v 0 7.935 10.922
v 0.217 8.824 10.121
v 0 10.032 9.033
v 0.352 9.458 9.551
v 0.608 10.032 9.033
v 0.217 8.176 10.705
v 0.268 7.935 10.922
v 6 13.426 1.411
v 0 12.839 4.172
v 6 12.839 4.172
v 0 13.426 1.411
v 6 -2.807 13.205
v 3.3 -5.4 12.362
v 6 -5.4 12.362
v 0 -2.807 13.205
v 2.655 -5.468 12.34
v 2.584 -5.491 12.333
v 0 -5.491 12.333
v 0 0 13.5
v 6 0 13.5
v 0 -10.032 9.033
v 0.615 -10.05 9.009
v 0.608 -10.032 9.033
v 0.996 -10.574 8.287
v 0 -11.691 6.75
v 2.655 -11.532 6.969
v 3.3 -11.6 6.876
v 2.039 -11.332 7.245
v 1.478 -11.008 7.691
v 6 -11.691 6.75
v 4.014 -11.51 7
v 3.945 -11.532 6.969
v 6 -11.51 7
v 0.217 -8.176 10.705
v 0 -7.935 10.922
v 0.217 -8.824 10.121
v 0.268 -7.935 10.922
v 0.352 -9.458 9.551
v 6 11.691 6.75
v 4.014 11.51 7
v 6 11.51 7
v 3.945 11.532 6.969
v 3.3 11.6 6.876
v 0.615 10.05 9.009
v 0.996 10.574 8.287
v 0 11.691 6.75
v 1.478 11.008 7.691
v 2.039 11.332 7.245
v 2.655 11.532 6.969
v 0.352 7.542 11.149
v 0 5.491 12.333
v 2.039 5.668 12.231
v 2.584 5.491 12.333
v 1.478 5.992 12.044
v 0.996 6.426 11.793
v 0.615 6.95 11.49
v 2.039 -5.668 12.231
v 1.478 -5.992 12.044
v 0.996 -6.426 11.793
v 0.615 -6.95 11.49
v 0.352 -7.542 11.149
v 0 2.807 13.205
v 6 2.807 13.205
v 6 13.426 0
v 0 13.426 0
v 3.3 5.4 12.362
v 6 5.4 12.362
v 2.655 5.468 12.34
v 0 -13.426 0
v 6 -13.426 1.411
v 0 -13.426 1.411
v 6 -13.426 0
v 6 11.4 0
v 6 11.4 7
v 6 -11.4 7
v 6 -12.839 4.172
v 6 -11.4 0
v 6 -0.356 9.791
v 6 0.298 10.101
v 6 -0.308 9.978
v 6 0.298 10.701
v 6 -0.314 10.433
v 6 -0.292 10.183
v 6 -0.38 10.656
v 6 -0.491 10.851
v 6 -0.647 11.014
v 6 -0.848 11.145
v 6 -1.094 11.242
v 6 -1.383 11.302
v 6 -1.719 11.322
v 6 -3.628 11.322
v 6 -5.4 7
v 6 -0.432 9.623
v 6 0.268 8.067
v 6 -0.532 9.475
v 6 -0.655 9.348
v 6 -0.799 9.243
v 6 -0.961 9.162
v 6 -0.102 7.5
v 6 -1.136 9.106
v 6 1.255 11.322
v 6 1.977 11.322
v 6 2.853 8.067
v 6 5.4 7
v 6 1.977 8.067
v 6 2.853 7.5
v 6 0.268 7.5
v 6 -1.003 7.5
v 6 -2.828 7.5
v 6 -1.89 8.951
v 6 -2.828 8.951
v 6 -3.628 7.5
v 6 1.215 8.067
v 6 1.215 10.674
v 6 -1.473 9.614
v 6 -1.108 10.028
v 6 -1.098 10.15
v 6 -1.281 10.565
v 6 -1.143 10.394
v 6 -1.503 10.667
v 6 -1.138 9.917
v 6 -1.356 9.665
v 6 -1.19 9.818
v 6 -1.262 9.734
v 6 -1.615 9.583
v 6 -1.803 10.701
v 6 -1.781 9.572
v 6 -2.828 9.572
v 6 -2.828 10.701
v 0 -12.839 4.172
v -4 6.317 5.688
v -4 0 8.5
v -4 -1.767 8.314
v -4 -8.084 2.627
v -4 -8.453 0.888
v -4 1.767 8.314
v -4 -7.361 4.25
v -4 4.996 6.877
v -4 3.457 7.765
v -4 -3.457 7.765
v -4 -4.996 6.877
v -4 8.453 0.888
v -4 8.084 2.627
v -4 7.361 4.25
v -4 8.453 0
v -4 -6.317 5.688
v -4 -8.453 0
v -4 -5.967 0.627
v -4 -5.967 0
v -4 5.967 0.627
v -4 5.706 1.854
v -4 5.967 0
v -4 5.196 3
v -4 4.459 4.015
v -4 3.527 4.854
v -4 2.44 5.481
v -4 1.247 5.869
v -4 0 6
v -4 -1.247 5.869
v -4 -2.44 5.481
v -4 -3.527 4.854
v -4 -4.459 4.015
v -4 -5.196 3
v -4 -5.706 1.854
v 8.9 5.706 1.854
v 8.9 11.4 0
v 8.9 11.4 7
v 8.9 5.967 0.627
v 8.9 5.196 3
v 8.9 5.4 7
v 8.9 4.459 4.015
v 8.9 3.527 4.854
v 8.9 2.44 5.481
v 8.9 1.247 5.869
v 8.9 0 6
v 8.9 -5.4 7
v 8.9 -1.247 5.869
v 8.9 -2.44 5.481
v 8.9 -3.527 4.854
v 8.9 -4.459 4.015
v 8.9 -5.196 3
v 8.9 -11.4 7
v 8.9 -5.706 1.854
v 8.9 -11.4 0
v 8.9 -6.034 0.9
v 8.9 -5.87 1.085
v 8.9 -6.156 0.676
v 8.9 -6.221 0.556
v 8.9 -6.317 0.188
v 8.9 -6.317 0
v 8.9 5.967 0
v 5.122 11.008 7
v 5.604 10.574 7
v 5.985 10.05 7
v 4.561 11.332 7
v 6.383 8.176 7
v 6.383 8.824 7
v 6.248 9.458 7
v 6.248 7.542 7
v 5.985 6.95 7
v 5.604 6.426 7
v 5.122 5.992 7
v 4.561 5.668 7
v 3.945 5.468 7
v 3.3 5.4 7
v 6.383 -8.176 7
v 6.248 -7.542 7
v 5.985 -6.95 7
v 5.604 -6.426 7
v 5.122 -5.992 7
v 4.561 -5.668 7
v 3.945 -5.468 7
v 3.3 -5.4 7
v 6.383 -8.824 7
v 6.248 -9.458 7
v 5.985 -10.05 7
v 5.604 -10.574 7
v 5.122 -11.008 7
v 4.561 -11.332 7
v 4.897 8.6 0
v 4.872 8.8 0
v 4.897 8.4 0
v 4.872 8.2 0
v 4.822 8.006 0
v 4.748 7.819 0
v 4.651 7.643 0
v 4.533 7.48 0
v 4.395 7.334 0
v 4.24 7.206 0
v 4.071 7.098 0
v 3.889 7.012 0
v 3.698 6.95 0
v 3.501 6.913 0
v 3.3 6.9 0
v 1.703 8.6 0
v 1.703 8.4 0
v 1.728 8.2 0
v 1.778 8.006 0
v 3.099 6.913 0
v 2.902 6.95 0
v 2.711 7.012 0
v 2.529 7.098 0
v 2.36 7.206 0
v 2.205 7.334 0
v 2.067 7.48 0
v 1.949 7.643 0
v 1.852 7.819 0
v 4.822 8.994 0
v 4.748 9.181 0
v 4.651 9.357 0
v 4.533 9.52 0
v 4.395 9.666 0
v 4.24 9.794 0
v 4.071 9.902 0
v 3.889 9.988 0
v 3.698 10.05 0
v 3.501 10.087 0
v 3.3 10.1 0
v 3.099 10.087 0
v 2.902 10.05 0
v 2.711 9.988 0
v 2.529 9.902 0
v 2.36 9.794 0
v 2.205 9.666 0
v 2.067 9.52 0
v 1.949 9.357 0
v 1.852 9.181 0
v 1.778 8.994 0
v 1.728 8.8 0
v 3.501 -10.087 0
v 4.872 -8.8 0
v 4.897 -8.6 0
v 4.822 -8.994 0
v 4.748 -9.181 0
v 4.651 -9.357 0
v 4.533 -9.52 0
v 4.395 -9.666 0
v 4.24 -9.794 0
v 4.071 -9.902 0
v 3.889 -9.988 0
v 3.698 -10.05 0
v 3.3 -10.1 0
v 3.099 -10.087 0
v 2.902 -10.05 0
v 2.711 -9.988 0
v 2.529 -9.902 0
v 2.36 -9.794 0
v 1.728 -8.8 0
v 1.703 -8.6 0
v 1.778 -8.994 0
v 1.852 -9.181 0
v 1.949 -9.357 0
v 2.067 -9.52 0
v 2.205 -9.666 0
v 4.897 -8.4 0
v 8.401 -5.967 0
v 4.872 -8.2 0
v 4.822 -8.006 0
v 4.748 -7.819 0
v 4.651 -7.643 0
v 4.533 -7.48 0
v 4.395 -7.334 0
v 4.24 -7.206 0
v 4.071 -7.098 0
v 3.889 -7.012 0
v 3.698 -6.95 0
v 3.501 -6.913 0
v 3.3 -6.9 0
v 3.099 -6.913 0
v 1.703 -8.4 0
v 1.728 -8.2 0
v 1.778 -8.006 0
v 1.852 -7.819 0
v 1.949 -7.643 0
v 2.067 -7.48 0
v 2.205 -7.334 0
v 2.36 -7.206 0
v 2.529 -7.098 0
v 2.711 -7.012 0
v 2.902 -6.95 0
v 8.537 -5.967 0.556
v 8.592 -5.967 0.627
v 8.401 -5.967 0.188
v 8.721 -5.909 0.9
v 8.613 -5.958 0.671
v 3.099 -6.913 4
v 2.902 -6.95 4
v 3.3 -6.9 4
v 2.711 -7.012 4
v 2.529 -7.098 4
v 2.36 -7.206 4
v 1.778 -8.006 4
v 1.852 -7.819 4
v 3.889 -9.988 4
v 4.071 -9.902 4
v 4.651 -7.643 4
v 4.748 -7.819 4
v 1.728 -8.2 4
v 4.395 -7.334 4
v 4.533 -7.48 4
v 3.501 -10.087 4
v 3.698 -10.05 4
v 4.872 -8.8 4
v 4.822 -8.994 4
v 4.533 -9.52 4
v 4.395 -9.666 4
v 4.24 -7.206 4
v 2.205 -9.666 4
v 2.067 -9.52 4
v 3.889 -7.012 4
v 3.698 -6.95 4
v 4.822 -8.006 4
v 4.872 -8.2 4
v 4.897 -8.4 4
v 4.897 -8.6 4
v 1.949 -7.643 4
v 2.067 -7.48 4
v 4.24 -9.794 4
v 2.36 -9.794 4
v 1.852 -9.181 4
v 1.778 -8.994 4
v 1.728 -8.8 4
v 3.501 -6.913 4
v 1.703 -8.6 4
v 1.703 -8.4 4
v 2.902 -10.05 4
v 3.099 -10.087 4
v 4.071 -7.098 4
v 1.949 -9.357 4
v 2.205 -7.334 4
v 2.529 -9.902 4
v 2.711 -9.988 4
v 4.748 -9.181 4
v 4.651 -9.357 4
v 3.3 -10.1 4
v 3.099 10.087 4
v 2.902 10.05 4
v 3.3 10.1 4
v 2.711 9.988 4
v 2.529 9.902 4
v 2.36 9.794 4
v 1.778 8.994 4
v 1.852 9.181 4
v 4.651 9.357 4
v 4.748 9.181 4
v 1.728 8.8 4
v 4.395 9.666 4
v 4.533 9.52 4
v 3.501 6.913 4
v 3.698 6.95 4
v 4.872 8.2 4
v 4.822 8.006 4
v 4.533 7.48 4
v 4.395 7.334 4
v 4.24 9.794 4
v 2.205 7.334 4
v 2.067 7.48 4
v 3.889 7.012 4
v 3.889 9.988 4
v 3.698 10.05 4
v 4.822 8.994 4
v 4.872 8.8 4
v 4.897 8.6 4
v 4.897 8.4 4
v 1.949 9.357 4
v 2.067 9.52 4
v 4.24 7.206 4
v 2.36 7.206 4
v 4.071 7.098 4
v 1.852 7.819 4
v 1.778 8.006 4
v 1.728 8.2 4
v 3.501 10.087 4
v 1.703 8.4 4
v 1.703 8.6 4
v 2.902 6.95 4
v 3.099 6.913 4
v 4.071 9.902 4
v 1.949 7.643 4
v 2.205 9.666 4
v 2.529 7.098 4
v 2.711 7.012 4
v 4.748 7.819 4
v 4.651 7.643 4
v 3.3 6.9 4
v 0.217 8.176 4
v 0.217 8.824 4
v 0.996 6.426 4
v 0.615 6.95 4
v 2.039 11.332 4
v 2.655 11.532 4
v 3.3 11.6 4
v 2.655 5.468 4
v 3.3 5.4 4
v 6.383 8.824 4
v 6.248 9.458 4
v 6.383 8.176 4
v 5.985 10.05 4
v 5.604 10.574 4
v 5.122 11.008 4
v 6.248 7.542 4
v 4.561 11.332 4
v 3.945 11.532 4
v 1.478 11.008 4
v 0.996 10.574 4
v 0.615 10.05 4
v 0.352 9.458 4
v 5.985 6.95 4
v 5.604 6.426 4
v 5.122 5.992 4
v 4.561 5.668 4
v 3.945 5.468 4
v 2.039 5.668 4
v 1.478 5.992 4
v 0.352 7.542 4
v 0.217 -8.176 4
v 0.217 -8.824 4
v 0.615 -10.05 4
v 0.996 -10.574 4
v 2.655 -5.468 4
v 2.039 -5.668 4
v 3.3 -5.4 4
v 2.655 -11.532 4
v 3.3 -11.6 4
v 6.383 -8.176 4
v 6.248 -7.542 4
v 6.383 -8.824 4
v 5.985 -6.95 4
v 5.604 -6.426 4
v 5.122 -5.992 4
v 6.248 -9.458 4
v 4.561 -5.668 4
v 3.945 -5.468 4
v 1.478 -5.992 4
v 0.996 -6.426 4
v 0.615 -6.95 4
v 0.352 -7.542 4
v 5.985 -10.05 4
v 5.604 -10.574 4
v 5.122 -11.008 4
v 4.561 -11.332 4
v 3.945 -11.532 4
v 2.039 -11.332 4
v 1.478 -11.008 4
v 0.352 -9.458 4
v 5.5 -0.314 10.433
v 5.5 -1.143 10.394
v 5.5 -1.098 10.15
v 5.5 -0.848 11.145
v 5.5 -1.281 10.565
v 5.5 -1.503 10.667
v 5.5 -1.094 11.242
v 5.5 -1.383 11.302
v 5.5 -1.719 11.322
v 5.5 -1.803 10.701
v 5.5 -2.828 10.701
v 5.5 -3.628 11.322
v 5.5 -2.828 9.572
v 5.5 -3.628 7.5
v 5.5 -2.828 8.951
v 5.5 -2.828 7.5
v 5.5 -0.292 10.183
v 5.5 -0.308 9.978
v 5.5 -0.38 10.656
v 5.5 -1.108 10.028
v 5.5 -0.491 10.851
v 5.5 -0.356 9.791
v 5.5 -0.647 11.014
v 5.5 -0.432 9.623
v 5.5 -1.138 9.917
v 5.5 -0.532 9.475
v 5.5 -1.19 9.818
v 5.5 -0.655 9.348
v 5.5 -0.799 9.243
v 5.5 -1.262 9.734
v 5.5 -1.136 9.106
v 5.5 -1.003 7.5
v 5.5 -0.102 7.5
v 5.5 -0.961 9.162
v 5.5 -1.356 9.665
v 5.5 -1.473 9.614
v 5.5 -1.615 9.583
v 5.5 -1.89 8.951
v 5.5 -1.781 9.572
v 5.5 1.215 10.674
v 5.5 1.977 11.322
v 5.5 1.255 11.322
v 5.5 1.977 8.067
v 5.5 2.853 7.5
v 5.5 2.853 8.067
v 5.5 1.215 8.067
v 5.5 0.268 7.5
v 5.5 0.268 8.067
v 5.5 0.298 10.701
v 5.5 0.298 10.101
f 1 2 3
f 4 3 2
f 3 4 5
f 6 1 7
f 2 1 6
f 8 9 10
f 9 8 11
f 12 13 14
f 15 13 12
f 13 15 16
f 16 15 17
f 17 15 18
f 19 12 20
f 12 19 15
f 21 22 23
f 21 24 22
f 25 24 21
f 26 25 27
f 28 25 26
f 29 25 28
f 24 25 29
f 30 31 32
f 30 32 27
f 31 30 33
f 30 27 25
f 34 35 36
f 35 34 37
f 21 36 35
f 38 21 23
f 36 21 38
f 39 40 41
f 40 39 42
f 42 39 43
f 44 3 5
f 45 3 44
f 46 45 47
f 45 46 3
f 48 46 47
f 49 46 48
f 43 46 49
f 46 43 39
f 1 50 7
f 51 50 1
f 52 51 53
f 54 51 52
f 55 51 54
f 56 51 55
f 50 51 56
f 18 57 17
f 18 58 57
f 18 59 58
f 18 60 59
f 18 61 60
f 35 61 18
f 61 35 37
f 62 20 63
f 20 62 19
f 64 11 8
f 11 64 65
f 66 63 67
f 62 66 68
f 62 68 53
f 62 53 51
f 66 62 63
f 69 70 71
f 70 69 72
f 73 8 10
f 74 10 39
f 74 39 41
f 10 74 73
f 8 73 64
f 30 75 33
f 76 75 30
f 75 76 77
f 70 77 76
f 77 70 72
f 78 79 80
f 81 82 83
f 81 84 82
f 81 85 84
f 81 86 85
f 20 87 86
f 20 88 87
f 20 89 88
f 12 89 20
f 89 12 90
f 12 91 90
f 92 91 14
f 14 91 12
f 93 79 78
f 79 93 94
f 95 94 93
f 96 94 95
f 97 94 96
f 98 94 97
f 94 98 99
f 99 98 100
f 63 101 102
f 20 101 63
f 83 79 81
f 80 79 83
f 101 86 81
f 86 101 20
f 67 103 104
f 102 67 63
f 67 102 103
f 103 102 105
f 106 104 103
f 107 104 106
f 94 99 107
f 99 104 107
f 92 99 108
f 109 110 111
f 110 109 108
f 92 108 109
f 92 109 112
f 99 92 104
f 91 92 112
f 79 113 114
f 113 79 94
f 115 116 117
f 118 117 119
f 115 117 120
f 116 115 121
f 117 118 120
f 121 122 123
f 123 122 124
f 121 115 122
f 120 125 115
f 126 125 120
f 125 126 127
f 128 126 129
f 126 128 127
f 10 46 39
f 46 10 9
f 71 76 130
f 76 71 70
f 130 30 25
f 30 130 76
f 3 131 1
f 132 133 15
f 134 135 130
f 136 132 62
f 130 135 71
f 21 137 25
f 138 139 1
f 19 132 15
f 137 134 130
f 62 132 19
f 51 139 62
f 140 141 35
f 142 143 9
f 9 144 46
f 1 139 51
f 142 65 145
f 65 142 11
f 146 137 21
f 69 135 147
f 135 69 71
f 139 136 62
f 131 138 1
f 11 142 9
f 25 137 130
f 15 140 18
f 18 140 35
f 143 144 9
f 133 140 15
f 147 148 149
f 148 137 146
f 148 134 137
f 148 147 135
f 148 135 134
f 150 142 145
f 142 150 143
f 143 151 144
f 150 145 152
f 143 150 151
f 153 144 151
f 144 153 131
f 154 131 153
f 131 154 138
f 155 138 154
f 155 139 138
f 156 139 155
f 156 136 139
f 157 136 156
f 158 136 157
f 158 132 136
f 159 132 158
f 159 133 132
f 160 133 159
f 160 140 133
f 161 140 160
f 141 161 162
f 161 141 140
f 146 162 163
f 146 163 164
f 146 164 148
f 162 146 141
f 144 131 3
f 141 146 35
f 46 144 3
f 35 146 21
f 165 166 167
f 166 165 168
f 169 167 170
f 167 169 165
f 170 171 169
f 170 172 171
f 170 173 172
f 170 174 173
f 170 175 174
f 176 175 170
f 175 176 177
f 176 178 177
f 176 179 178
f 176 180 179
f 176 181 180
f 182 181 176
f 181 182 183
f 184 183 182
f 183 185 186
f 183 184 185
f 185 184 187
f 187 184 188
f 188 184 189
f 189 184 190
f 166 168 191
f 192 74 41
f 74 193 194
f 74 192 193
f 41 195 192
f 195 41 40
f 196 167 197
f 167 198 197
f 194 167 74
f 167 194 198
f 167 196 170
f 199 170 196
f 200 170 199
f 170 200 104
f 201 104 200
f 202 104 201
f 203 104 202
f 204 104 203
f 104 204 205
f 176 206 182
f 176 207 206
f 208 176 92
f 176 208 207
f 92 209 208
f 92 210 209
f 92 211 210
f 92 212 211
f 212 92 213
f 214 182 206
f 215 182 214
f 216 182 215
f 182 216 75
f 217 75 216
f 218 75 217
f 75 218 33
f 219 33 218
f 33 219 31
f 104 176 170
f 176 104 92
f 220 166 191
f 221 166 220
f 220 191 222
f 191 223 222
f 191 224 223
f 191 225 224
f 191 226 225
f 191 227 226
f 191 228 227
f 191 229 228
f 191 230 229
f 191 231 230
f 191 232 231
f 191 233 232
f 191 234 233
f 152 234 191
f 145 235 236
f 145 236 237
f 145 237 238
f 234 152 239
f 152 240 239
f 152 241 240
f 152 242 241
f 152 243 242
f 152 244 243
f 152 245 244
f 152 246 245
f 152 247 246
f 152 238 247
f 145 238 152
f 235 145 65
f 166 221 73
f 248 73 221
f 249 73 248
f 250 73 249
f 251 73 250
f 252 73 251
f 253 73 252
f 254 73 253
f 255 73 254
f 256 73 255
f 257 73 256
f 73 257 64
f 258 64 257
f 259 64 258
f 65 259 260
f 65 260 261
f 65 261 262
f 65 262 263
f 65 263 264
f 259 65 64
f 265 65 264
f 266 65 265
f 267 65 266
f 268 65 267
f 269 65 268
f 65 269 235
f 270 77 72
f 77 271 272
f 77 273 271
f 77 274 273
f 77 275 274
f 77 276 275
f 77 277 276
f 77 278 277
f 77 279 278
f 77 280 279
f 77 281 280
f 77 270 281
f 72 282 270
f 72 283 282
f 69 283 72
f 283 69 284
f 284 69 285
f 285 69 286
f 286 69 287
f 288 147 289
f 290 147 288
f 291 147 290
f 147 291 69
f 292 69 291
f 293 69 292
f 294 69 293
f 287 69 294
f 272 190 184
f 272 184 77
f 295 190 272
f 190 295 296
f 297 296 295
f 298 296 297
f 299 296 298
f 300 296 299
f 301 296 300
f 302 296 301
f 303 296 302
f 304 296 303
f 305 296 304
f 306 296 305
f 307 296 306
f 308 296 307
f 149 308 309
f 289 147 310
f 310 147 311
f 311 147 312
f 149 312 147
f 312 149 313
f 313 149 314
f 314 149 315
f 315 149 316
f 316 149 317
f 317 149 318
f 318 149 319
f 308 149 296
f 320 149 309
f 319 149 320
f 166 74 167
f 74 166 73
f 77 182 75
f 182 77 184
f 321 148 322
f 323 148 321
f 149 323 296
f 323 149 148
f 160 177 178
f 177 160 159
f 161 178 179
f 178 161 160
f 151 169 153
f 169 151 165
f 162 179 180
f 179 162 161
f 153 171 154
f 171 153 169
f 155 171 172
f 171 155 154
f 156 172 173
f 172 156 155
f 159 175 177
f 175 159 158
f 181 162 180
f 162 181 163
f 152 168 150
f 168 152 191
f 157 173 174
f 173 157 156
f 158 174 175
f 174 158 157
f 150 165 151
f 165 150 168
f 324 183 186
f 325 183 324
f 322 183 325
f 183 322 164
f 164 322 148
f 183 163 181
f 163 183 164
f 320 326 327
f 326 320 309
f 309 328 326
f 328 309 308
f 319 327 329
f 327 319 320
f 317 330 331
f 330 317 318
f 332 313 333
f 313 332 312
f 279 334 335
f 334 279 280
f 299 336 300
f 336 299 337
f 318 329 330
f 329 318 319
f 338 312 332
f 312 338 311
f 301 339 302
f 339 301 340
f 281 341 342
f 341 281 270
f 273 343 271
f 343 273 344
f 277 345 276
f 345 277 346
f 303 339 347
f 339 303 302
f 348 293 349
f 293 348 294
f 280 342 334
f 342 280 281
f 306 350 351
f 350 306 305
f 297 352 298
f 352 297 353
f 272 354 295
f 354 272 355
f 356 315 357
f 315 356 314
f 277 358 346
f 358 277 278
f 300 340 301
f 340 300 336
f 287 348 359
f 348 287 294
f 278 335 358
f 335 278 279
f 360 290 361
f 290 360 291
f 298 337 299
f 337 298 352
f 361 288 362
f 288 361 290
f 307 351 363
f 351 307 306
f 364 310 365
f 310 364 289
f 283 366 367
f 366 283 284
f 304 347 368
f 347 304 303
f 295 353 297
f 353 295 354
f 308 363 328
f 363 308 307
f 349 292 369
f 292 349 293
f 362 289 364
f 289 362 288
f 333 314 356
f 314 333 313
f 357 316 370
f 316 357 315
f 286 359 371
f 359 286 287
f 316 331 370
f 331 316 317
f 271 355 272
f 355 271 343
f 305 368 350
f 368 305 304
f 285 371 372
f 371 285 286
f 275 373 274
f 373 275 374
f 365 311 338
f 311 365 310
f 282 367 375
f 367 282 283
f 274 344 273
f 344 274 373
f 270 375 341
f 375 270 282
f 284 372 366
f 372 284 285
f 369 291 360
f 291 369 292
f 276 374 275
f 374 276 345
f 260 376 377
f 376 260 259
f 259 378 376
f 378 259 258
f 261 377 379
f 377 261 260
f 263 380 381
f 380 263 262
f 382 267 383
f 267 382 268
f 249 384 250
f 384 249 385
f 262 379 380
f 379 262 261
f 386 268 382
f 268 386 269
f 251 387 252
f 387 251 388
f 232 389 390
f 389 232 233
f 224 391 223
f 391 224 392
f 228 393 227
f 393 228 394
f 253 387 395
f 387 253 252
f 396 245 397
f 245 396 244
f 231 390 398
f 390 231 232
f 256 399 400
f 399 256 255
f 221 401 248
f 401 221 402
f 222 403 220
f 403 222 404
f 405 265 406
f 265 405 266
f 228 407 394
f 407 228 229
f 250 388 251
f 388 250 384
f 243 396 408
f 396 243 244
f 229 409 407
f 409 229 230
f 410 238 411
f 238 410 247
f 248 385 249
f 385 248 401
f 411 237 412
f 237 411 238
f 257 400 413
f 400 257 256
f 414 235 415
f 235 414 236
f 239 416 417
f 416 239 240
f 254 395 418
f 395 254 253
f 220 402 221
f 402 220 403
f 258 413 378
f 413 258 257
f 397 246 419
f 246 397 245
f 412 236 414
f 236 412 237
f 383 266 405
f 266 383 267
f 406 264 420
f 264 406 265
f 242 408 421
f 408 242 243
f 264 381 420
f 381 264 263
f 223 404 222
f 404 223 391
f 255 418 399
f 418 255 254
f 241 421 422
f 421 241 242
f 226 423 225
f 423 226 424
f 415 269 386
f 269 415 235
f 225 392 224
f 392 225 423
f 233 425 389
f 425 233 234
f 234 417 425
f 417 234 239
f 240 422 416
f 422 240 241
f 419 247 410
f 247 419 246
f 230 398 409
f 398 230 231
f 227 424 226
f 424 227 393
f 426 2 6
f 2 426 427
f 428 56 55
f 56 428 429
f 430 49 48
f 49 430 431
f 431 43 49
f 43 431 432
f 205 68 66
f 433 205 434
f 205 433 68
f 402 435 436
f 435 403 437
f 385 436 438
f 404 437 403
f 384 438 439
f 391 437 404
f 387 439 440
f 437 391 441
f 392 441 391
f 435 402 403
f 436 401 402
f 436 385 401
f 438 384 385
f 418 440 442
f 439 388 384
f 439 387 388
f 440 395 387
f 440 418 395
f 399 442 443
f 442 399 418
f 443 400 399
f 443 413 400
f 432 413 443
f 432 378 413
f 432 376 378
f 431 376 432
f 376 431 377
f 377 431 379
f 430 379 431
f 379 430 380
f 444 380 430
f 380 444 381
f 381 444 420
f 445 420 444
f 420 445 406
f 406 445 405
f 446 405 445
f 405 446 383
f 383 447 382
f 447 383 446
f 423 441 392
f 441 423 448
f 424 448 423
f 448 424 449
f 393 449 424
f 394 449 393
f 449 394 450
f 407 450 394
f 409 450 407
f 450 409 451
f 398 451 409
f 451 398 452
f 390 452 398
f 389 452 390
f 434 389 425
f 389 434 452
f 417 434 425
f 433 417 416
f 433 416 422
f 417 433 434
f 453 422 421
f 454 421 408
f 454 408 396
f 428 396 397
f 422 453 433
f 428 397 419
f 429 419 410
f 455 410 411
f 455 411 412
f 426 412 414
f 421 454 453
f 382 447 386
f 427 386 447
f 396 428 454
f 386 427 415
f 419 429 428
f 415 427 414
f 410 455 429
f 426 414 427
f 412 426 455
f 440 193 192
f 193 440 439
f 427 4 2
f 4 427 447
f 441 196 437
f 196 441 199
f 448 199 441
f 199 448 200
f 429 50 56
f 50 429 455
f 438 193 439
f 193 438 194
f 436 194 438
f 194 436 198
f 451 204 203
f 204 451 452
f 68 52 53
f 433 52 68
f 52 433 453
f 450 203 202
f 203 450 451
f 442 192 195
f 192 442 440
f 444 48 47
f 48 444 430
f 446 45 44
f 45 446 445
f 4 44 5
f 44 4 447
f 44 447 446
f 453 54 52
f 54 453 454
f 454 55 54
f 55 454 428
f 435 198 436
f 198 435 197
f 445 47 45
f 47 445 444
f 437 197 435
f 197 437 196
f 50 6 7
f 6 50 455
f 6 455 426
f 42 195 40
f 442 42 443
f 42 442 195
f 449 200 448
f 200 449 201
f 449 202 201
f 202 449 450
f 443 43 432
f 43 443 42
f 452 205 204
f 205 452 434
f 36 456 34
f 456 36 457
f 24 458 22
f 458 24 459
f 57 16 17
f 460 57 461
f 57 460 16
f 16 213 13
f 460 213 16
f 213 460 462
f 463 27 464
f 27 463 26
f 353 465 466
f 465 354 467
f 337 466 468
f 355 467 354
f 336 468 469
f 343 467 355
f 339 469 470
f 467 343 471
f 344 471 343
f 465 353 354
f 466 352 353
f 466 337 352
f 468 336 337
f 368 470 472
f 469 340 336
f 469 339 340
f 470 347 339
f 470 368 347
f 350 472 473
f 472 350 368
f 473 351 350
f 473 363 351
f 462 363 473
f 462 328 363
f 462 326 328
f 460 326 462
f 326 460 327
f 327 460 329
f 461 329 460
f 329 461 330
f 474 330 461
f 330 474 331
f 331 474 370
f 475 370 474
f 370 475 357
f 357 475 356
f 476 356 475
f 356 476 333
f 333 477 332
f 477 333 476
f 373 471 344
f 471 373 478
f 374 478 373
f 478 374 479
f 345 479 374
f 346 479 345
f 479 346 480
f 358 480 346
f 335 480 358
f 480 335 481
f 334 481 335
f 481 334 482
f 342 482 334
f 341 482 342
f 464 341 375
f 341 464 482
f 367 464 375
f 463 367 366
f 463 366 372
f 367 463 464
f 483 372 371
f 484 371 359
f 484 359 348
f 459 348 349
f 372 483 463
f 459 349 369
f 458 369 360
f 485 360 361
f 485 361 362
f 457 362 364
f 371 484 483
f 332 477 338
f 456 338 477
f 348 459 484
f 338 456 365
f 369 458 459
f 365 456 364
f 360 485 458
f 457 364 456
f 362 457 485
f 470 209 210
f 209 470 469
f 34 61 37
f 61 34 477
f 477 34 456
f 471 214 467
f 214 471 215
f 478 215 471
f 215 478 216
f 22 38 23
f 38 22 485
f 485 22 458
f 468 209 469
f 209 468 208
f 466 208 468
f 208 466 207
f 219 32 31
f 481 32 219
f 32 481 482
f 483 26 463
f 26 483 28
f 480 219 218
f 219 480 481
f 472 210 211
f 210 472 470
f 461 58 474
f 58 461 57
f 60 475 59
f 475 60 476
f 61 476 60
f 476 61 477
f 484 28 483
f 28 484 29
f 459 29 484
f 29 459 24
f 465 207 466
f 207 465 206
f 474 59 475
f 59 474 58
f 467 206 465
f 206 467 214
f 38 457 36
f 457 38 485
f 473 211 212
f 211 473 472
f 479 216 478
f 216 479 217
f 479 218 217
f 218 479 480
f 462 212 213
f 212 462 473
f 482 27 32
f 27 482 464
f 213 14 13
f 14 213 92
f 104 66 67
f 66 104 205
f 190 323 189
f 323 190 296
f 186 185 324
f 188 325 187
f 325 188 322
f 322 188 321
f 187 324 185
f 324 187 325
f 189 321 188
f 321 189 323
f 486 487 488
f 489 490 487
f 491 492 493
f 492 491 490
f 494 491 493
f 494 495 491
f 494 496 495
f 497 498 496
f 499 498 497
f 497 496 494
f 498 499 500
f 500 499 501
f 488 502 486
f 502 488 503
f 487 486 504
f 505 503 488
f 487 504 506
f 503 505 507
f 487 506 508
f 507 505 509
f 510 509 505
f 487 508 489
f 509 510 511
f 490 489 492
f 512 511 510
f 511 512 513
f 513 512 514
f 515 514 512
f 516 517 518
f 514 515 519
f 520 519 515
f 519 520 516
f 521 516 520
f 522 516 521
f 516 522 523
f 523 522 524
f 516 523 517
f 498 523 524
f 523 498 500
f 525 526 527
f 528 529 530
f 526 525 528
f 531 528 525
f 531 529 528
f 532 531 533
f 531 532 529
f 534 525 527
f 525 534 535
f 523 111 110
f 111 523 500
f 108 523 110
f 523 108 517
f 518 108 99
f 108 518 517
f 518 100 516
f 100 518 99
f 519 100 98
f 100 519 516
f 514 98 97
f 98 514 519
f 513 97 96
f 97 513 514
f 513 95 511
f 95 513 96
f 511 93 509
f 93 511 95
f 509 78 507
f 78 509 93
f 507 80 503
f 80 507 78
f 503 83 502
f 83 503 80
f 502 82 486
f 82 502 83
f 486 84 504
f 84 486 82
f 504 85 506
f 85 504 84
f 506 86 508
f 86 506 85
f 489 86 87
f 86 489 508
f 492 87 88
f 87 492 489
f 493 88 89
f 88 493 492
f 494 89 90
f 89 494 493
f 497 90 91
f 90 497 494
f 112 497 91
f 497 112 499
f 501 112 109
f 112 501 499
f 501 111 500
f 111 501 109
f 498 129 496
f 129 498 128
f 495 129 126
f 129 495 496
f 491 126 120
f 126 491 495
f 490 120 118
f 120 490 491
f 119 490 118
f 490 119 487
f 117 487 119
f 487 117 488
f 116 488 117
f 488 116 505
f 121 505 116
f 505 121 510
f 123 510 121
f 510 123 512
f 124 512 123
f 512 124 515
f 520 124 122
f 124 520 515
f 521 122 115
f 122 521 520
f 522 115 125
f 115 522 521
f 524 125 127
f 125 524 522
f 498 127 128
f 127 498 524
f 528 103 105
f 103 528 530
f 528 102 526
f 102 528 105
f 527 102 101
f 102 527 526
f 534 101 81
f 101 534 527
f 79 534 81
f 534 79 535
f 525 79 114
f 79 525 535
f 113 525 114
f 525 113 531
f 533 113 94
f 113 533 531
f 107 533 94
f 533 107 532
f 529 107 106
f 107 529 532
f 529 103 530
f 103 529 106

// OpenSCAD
// PIRANHA iteration1
// Extruder cable clip
// GNU GPL v3
// Usan Siriwardana <usiriwar@uwaterloo.ca> and contributors
// based on Prusa i3 MK3S
// https://reprap.org/wiki/Prusa_i3_MK3

module extruder_cable_clip()
{
        
    difference(){
    difference()
    {
        union()
        {
            // body shape
            translate([-6,28,28]) rotate([0,90,0]) cylinder(h=6,r=13.5,$fn=30);  
            translate([-10,28,28]) rotate([0,90,0]) cylinder(h=4,r1=8.5,r2=13.5, $fn=30);  
            translate([0,16.6,28]) cube([2.9,22.8,7]); 
        }
        
        // bottom cut and shape
        translate([-15,7,13]) cube([30,40,15]); 
        translate([-20,28,28]) rotate([0,90,0]) cylinder(h=40,r=6, $fn=30);
        
        // screws
        translate([-2.7,19.5,25]) rotate([0,0,90]) cylinder(h= 10, r = 1.6, $fn=50); 
        translate([-2.7,36.5,25]) rotate([0,0,90]) cylinder( h = 10, r = 1.6, $fn=50); 
        translate([-2.7,36.5,32]) rotate([0,0,90]) cylinder( h = 13, r = 3.1, $fn=30);
        translate([-2.7,19.5,32]) rotate([0,0,90]) cylinder( h = 13, r = 3.1, $fn=30); 
        
        // screw heads opening
        translate([-2.7,16.4,35]) cube([10,6.2,15]); 
        translate([-2.7,33.4,35]) cube([10,6.2,15]); 
        
        
    }
    
    difference()
    {
        // cable grip
        translate([-8,28,28]) rotate([0,90,0]) cylinder( h = 10, r = 6, $fn=30);
        translate([-20,28,28]) rotate([0,90,0]) cylinder( h = 40, r = 5.5, $fn=30);
        translate([-15,7,13]) cube([30,40,15]); 
        translate([-6,7,13]) cube([2,40,25]); 
        translate([-2,7,13]) cube([2,40,25]); 
        
    }
    
    
    //nylon hole
        
        translate([-3,28,28]) rotate([35,90,0]) cylinder( h = 24,r = 1.8,$fn=30);
        
     // version
        translate([-0.5,24,35.5]) rotate([90,0,90]) linear_extrude(height = 0.6) 
        { text("R1",font = "helvetica:style=Bold", size=4); }   
    }
}

translate([6,-28,-28]) extruder_cable_clip();
